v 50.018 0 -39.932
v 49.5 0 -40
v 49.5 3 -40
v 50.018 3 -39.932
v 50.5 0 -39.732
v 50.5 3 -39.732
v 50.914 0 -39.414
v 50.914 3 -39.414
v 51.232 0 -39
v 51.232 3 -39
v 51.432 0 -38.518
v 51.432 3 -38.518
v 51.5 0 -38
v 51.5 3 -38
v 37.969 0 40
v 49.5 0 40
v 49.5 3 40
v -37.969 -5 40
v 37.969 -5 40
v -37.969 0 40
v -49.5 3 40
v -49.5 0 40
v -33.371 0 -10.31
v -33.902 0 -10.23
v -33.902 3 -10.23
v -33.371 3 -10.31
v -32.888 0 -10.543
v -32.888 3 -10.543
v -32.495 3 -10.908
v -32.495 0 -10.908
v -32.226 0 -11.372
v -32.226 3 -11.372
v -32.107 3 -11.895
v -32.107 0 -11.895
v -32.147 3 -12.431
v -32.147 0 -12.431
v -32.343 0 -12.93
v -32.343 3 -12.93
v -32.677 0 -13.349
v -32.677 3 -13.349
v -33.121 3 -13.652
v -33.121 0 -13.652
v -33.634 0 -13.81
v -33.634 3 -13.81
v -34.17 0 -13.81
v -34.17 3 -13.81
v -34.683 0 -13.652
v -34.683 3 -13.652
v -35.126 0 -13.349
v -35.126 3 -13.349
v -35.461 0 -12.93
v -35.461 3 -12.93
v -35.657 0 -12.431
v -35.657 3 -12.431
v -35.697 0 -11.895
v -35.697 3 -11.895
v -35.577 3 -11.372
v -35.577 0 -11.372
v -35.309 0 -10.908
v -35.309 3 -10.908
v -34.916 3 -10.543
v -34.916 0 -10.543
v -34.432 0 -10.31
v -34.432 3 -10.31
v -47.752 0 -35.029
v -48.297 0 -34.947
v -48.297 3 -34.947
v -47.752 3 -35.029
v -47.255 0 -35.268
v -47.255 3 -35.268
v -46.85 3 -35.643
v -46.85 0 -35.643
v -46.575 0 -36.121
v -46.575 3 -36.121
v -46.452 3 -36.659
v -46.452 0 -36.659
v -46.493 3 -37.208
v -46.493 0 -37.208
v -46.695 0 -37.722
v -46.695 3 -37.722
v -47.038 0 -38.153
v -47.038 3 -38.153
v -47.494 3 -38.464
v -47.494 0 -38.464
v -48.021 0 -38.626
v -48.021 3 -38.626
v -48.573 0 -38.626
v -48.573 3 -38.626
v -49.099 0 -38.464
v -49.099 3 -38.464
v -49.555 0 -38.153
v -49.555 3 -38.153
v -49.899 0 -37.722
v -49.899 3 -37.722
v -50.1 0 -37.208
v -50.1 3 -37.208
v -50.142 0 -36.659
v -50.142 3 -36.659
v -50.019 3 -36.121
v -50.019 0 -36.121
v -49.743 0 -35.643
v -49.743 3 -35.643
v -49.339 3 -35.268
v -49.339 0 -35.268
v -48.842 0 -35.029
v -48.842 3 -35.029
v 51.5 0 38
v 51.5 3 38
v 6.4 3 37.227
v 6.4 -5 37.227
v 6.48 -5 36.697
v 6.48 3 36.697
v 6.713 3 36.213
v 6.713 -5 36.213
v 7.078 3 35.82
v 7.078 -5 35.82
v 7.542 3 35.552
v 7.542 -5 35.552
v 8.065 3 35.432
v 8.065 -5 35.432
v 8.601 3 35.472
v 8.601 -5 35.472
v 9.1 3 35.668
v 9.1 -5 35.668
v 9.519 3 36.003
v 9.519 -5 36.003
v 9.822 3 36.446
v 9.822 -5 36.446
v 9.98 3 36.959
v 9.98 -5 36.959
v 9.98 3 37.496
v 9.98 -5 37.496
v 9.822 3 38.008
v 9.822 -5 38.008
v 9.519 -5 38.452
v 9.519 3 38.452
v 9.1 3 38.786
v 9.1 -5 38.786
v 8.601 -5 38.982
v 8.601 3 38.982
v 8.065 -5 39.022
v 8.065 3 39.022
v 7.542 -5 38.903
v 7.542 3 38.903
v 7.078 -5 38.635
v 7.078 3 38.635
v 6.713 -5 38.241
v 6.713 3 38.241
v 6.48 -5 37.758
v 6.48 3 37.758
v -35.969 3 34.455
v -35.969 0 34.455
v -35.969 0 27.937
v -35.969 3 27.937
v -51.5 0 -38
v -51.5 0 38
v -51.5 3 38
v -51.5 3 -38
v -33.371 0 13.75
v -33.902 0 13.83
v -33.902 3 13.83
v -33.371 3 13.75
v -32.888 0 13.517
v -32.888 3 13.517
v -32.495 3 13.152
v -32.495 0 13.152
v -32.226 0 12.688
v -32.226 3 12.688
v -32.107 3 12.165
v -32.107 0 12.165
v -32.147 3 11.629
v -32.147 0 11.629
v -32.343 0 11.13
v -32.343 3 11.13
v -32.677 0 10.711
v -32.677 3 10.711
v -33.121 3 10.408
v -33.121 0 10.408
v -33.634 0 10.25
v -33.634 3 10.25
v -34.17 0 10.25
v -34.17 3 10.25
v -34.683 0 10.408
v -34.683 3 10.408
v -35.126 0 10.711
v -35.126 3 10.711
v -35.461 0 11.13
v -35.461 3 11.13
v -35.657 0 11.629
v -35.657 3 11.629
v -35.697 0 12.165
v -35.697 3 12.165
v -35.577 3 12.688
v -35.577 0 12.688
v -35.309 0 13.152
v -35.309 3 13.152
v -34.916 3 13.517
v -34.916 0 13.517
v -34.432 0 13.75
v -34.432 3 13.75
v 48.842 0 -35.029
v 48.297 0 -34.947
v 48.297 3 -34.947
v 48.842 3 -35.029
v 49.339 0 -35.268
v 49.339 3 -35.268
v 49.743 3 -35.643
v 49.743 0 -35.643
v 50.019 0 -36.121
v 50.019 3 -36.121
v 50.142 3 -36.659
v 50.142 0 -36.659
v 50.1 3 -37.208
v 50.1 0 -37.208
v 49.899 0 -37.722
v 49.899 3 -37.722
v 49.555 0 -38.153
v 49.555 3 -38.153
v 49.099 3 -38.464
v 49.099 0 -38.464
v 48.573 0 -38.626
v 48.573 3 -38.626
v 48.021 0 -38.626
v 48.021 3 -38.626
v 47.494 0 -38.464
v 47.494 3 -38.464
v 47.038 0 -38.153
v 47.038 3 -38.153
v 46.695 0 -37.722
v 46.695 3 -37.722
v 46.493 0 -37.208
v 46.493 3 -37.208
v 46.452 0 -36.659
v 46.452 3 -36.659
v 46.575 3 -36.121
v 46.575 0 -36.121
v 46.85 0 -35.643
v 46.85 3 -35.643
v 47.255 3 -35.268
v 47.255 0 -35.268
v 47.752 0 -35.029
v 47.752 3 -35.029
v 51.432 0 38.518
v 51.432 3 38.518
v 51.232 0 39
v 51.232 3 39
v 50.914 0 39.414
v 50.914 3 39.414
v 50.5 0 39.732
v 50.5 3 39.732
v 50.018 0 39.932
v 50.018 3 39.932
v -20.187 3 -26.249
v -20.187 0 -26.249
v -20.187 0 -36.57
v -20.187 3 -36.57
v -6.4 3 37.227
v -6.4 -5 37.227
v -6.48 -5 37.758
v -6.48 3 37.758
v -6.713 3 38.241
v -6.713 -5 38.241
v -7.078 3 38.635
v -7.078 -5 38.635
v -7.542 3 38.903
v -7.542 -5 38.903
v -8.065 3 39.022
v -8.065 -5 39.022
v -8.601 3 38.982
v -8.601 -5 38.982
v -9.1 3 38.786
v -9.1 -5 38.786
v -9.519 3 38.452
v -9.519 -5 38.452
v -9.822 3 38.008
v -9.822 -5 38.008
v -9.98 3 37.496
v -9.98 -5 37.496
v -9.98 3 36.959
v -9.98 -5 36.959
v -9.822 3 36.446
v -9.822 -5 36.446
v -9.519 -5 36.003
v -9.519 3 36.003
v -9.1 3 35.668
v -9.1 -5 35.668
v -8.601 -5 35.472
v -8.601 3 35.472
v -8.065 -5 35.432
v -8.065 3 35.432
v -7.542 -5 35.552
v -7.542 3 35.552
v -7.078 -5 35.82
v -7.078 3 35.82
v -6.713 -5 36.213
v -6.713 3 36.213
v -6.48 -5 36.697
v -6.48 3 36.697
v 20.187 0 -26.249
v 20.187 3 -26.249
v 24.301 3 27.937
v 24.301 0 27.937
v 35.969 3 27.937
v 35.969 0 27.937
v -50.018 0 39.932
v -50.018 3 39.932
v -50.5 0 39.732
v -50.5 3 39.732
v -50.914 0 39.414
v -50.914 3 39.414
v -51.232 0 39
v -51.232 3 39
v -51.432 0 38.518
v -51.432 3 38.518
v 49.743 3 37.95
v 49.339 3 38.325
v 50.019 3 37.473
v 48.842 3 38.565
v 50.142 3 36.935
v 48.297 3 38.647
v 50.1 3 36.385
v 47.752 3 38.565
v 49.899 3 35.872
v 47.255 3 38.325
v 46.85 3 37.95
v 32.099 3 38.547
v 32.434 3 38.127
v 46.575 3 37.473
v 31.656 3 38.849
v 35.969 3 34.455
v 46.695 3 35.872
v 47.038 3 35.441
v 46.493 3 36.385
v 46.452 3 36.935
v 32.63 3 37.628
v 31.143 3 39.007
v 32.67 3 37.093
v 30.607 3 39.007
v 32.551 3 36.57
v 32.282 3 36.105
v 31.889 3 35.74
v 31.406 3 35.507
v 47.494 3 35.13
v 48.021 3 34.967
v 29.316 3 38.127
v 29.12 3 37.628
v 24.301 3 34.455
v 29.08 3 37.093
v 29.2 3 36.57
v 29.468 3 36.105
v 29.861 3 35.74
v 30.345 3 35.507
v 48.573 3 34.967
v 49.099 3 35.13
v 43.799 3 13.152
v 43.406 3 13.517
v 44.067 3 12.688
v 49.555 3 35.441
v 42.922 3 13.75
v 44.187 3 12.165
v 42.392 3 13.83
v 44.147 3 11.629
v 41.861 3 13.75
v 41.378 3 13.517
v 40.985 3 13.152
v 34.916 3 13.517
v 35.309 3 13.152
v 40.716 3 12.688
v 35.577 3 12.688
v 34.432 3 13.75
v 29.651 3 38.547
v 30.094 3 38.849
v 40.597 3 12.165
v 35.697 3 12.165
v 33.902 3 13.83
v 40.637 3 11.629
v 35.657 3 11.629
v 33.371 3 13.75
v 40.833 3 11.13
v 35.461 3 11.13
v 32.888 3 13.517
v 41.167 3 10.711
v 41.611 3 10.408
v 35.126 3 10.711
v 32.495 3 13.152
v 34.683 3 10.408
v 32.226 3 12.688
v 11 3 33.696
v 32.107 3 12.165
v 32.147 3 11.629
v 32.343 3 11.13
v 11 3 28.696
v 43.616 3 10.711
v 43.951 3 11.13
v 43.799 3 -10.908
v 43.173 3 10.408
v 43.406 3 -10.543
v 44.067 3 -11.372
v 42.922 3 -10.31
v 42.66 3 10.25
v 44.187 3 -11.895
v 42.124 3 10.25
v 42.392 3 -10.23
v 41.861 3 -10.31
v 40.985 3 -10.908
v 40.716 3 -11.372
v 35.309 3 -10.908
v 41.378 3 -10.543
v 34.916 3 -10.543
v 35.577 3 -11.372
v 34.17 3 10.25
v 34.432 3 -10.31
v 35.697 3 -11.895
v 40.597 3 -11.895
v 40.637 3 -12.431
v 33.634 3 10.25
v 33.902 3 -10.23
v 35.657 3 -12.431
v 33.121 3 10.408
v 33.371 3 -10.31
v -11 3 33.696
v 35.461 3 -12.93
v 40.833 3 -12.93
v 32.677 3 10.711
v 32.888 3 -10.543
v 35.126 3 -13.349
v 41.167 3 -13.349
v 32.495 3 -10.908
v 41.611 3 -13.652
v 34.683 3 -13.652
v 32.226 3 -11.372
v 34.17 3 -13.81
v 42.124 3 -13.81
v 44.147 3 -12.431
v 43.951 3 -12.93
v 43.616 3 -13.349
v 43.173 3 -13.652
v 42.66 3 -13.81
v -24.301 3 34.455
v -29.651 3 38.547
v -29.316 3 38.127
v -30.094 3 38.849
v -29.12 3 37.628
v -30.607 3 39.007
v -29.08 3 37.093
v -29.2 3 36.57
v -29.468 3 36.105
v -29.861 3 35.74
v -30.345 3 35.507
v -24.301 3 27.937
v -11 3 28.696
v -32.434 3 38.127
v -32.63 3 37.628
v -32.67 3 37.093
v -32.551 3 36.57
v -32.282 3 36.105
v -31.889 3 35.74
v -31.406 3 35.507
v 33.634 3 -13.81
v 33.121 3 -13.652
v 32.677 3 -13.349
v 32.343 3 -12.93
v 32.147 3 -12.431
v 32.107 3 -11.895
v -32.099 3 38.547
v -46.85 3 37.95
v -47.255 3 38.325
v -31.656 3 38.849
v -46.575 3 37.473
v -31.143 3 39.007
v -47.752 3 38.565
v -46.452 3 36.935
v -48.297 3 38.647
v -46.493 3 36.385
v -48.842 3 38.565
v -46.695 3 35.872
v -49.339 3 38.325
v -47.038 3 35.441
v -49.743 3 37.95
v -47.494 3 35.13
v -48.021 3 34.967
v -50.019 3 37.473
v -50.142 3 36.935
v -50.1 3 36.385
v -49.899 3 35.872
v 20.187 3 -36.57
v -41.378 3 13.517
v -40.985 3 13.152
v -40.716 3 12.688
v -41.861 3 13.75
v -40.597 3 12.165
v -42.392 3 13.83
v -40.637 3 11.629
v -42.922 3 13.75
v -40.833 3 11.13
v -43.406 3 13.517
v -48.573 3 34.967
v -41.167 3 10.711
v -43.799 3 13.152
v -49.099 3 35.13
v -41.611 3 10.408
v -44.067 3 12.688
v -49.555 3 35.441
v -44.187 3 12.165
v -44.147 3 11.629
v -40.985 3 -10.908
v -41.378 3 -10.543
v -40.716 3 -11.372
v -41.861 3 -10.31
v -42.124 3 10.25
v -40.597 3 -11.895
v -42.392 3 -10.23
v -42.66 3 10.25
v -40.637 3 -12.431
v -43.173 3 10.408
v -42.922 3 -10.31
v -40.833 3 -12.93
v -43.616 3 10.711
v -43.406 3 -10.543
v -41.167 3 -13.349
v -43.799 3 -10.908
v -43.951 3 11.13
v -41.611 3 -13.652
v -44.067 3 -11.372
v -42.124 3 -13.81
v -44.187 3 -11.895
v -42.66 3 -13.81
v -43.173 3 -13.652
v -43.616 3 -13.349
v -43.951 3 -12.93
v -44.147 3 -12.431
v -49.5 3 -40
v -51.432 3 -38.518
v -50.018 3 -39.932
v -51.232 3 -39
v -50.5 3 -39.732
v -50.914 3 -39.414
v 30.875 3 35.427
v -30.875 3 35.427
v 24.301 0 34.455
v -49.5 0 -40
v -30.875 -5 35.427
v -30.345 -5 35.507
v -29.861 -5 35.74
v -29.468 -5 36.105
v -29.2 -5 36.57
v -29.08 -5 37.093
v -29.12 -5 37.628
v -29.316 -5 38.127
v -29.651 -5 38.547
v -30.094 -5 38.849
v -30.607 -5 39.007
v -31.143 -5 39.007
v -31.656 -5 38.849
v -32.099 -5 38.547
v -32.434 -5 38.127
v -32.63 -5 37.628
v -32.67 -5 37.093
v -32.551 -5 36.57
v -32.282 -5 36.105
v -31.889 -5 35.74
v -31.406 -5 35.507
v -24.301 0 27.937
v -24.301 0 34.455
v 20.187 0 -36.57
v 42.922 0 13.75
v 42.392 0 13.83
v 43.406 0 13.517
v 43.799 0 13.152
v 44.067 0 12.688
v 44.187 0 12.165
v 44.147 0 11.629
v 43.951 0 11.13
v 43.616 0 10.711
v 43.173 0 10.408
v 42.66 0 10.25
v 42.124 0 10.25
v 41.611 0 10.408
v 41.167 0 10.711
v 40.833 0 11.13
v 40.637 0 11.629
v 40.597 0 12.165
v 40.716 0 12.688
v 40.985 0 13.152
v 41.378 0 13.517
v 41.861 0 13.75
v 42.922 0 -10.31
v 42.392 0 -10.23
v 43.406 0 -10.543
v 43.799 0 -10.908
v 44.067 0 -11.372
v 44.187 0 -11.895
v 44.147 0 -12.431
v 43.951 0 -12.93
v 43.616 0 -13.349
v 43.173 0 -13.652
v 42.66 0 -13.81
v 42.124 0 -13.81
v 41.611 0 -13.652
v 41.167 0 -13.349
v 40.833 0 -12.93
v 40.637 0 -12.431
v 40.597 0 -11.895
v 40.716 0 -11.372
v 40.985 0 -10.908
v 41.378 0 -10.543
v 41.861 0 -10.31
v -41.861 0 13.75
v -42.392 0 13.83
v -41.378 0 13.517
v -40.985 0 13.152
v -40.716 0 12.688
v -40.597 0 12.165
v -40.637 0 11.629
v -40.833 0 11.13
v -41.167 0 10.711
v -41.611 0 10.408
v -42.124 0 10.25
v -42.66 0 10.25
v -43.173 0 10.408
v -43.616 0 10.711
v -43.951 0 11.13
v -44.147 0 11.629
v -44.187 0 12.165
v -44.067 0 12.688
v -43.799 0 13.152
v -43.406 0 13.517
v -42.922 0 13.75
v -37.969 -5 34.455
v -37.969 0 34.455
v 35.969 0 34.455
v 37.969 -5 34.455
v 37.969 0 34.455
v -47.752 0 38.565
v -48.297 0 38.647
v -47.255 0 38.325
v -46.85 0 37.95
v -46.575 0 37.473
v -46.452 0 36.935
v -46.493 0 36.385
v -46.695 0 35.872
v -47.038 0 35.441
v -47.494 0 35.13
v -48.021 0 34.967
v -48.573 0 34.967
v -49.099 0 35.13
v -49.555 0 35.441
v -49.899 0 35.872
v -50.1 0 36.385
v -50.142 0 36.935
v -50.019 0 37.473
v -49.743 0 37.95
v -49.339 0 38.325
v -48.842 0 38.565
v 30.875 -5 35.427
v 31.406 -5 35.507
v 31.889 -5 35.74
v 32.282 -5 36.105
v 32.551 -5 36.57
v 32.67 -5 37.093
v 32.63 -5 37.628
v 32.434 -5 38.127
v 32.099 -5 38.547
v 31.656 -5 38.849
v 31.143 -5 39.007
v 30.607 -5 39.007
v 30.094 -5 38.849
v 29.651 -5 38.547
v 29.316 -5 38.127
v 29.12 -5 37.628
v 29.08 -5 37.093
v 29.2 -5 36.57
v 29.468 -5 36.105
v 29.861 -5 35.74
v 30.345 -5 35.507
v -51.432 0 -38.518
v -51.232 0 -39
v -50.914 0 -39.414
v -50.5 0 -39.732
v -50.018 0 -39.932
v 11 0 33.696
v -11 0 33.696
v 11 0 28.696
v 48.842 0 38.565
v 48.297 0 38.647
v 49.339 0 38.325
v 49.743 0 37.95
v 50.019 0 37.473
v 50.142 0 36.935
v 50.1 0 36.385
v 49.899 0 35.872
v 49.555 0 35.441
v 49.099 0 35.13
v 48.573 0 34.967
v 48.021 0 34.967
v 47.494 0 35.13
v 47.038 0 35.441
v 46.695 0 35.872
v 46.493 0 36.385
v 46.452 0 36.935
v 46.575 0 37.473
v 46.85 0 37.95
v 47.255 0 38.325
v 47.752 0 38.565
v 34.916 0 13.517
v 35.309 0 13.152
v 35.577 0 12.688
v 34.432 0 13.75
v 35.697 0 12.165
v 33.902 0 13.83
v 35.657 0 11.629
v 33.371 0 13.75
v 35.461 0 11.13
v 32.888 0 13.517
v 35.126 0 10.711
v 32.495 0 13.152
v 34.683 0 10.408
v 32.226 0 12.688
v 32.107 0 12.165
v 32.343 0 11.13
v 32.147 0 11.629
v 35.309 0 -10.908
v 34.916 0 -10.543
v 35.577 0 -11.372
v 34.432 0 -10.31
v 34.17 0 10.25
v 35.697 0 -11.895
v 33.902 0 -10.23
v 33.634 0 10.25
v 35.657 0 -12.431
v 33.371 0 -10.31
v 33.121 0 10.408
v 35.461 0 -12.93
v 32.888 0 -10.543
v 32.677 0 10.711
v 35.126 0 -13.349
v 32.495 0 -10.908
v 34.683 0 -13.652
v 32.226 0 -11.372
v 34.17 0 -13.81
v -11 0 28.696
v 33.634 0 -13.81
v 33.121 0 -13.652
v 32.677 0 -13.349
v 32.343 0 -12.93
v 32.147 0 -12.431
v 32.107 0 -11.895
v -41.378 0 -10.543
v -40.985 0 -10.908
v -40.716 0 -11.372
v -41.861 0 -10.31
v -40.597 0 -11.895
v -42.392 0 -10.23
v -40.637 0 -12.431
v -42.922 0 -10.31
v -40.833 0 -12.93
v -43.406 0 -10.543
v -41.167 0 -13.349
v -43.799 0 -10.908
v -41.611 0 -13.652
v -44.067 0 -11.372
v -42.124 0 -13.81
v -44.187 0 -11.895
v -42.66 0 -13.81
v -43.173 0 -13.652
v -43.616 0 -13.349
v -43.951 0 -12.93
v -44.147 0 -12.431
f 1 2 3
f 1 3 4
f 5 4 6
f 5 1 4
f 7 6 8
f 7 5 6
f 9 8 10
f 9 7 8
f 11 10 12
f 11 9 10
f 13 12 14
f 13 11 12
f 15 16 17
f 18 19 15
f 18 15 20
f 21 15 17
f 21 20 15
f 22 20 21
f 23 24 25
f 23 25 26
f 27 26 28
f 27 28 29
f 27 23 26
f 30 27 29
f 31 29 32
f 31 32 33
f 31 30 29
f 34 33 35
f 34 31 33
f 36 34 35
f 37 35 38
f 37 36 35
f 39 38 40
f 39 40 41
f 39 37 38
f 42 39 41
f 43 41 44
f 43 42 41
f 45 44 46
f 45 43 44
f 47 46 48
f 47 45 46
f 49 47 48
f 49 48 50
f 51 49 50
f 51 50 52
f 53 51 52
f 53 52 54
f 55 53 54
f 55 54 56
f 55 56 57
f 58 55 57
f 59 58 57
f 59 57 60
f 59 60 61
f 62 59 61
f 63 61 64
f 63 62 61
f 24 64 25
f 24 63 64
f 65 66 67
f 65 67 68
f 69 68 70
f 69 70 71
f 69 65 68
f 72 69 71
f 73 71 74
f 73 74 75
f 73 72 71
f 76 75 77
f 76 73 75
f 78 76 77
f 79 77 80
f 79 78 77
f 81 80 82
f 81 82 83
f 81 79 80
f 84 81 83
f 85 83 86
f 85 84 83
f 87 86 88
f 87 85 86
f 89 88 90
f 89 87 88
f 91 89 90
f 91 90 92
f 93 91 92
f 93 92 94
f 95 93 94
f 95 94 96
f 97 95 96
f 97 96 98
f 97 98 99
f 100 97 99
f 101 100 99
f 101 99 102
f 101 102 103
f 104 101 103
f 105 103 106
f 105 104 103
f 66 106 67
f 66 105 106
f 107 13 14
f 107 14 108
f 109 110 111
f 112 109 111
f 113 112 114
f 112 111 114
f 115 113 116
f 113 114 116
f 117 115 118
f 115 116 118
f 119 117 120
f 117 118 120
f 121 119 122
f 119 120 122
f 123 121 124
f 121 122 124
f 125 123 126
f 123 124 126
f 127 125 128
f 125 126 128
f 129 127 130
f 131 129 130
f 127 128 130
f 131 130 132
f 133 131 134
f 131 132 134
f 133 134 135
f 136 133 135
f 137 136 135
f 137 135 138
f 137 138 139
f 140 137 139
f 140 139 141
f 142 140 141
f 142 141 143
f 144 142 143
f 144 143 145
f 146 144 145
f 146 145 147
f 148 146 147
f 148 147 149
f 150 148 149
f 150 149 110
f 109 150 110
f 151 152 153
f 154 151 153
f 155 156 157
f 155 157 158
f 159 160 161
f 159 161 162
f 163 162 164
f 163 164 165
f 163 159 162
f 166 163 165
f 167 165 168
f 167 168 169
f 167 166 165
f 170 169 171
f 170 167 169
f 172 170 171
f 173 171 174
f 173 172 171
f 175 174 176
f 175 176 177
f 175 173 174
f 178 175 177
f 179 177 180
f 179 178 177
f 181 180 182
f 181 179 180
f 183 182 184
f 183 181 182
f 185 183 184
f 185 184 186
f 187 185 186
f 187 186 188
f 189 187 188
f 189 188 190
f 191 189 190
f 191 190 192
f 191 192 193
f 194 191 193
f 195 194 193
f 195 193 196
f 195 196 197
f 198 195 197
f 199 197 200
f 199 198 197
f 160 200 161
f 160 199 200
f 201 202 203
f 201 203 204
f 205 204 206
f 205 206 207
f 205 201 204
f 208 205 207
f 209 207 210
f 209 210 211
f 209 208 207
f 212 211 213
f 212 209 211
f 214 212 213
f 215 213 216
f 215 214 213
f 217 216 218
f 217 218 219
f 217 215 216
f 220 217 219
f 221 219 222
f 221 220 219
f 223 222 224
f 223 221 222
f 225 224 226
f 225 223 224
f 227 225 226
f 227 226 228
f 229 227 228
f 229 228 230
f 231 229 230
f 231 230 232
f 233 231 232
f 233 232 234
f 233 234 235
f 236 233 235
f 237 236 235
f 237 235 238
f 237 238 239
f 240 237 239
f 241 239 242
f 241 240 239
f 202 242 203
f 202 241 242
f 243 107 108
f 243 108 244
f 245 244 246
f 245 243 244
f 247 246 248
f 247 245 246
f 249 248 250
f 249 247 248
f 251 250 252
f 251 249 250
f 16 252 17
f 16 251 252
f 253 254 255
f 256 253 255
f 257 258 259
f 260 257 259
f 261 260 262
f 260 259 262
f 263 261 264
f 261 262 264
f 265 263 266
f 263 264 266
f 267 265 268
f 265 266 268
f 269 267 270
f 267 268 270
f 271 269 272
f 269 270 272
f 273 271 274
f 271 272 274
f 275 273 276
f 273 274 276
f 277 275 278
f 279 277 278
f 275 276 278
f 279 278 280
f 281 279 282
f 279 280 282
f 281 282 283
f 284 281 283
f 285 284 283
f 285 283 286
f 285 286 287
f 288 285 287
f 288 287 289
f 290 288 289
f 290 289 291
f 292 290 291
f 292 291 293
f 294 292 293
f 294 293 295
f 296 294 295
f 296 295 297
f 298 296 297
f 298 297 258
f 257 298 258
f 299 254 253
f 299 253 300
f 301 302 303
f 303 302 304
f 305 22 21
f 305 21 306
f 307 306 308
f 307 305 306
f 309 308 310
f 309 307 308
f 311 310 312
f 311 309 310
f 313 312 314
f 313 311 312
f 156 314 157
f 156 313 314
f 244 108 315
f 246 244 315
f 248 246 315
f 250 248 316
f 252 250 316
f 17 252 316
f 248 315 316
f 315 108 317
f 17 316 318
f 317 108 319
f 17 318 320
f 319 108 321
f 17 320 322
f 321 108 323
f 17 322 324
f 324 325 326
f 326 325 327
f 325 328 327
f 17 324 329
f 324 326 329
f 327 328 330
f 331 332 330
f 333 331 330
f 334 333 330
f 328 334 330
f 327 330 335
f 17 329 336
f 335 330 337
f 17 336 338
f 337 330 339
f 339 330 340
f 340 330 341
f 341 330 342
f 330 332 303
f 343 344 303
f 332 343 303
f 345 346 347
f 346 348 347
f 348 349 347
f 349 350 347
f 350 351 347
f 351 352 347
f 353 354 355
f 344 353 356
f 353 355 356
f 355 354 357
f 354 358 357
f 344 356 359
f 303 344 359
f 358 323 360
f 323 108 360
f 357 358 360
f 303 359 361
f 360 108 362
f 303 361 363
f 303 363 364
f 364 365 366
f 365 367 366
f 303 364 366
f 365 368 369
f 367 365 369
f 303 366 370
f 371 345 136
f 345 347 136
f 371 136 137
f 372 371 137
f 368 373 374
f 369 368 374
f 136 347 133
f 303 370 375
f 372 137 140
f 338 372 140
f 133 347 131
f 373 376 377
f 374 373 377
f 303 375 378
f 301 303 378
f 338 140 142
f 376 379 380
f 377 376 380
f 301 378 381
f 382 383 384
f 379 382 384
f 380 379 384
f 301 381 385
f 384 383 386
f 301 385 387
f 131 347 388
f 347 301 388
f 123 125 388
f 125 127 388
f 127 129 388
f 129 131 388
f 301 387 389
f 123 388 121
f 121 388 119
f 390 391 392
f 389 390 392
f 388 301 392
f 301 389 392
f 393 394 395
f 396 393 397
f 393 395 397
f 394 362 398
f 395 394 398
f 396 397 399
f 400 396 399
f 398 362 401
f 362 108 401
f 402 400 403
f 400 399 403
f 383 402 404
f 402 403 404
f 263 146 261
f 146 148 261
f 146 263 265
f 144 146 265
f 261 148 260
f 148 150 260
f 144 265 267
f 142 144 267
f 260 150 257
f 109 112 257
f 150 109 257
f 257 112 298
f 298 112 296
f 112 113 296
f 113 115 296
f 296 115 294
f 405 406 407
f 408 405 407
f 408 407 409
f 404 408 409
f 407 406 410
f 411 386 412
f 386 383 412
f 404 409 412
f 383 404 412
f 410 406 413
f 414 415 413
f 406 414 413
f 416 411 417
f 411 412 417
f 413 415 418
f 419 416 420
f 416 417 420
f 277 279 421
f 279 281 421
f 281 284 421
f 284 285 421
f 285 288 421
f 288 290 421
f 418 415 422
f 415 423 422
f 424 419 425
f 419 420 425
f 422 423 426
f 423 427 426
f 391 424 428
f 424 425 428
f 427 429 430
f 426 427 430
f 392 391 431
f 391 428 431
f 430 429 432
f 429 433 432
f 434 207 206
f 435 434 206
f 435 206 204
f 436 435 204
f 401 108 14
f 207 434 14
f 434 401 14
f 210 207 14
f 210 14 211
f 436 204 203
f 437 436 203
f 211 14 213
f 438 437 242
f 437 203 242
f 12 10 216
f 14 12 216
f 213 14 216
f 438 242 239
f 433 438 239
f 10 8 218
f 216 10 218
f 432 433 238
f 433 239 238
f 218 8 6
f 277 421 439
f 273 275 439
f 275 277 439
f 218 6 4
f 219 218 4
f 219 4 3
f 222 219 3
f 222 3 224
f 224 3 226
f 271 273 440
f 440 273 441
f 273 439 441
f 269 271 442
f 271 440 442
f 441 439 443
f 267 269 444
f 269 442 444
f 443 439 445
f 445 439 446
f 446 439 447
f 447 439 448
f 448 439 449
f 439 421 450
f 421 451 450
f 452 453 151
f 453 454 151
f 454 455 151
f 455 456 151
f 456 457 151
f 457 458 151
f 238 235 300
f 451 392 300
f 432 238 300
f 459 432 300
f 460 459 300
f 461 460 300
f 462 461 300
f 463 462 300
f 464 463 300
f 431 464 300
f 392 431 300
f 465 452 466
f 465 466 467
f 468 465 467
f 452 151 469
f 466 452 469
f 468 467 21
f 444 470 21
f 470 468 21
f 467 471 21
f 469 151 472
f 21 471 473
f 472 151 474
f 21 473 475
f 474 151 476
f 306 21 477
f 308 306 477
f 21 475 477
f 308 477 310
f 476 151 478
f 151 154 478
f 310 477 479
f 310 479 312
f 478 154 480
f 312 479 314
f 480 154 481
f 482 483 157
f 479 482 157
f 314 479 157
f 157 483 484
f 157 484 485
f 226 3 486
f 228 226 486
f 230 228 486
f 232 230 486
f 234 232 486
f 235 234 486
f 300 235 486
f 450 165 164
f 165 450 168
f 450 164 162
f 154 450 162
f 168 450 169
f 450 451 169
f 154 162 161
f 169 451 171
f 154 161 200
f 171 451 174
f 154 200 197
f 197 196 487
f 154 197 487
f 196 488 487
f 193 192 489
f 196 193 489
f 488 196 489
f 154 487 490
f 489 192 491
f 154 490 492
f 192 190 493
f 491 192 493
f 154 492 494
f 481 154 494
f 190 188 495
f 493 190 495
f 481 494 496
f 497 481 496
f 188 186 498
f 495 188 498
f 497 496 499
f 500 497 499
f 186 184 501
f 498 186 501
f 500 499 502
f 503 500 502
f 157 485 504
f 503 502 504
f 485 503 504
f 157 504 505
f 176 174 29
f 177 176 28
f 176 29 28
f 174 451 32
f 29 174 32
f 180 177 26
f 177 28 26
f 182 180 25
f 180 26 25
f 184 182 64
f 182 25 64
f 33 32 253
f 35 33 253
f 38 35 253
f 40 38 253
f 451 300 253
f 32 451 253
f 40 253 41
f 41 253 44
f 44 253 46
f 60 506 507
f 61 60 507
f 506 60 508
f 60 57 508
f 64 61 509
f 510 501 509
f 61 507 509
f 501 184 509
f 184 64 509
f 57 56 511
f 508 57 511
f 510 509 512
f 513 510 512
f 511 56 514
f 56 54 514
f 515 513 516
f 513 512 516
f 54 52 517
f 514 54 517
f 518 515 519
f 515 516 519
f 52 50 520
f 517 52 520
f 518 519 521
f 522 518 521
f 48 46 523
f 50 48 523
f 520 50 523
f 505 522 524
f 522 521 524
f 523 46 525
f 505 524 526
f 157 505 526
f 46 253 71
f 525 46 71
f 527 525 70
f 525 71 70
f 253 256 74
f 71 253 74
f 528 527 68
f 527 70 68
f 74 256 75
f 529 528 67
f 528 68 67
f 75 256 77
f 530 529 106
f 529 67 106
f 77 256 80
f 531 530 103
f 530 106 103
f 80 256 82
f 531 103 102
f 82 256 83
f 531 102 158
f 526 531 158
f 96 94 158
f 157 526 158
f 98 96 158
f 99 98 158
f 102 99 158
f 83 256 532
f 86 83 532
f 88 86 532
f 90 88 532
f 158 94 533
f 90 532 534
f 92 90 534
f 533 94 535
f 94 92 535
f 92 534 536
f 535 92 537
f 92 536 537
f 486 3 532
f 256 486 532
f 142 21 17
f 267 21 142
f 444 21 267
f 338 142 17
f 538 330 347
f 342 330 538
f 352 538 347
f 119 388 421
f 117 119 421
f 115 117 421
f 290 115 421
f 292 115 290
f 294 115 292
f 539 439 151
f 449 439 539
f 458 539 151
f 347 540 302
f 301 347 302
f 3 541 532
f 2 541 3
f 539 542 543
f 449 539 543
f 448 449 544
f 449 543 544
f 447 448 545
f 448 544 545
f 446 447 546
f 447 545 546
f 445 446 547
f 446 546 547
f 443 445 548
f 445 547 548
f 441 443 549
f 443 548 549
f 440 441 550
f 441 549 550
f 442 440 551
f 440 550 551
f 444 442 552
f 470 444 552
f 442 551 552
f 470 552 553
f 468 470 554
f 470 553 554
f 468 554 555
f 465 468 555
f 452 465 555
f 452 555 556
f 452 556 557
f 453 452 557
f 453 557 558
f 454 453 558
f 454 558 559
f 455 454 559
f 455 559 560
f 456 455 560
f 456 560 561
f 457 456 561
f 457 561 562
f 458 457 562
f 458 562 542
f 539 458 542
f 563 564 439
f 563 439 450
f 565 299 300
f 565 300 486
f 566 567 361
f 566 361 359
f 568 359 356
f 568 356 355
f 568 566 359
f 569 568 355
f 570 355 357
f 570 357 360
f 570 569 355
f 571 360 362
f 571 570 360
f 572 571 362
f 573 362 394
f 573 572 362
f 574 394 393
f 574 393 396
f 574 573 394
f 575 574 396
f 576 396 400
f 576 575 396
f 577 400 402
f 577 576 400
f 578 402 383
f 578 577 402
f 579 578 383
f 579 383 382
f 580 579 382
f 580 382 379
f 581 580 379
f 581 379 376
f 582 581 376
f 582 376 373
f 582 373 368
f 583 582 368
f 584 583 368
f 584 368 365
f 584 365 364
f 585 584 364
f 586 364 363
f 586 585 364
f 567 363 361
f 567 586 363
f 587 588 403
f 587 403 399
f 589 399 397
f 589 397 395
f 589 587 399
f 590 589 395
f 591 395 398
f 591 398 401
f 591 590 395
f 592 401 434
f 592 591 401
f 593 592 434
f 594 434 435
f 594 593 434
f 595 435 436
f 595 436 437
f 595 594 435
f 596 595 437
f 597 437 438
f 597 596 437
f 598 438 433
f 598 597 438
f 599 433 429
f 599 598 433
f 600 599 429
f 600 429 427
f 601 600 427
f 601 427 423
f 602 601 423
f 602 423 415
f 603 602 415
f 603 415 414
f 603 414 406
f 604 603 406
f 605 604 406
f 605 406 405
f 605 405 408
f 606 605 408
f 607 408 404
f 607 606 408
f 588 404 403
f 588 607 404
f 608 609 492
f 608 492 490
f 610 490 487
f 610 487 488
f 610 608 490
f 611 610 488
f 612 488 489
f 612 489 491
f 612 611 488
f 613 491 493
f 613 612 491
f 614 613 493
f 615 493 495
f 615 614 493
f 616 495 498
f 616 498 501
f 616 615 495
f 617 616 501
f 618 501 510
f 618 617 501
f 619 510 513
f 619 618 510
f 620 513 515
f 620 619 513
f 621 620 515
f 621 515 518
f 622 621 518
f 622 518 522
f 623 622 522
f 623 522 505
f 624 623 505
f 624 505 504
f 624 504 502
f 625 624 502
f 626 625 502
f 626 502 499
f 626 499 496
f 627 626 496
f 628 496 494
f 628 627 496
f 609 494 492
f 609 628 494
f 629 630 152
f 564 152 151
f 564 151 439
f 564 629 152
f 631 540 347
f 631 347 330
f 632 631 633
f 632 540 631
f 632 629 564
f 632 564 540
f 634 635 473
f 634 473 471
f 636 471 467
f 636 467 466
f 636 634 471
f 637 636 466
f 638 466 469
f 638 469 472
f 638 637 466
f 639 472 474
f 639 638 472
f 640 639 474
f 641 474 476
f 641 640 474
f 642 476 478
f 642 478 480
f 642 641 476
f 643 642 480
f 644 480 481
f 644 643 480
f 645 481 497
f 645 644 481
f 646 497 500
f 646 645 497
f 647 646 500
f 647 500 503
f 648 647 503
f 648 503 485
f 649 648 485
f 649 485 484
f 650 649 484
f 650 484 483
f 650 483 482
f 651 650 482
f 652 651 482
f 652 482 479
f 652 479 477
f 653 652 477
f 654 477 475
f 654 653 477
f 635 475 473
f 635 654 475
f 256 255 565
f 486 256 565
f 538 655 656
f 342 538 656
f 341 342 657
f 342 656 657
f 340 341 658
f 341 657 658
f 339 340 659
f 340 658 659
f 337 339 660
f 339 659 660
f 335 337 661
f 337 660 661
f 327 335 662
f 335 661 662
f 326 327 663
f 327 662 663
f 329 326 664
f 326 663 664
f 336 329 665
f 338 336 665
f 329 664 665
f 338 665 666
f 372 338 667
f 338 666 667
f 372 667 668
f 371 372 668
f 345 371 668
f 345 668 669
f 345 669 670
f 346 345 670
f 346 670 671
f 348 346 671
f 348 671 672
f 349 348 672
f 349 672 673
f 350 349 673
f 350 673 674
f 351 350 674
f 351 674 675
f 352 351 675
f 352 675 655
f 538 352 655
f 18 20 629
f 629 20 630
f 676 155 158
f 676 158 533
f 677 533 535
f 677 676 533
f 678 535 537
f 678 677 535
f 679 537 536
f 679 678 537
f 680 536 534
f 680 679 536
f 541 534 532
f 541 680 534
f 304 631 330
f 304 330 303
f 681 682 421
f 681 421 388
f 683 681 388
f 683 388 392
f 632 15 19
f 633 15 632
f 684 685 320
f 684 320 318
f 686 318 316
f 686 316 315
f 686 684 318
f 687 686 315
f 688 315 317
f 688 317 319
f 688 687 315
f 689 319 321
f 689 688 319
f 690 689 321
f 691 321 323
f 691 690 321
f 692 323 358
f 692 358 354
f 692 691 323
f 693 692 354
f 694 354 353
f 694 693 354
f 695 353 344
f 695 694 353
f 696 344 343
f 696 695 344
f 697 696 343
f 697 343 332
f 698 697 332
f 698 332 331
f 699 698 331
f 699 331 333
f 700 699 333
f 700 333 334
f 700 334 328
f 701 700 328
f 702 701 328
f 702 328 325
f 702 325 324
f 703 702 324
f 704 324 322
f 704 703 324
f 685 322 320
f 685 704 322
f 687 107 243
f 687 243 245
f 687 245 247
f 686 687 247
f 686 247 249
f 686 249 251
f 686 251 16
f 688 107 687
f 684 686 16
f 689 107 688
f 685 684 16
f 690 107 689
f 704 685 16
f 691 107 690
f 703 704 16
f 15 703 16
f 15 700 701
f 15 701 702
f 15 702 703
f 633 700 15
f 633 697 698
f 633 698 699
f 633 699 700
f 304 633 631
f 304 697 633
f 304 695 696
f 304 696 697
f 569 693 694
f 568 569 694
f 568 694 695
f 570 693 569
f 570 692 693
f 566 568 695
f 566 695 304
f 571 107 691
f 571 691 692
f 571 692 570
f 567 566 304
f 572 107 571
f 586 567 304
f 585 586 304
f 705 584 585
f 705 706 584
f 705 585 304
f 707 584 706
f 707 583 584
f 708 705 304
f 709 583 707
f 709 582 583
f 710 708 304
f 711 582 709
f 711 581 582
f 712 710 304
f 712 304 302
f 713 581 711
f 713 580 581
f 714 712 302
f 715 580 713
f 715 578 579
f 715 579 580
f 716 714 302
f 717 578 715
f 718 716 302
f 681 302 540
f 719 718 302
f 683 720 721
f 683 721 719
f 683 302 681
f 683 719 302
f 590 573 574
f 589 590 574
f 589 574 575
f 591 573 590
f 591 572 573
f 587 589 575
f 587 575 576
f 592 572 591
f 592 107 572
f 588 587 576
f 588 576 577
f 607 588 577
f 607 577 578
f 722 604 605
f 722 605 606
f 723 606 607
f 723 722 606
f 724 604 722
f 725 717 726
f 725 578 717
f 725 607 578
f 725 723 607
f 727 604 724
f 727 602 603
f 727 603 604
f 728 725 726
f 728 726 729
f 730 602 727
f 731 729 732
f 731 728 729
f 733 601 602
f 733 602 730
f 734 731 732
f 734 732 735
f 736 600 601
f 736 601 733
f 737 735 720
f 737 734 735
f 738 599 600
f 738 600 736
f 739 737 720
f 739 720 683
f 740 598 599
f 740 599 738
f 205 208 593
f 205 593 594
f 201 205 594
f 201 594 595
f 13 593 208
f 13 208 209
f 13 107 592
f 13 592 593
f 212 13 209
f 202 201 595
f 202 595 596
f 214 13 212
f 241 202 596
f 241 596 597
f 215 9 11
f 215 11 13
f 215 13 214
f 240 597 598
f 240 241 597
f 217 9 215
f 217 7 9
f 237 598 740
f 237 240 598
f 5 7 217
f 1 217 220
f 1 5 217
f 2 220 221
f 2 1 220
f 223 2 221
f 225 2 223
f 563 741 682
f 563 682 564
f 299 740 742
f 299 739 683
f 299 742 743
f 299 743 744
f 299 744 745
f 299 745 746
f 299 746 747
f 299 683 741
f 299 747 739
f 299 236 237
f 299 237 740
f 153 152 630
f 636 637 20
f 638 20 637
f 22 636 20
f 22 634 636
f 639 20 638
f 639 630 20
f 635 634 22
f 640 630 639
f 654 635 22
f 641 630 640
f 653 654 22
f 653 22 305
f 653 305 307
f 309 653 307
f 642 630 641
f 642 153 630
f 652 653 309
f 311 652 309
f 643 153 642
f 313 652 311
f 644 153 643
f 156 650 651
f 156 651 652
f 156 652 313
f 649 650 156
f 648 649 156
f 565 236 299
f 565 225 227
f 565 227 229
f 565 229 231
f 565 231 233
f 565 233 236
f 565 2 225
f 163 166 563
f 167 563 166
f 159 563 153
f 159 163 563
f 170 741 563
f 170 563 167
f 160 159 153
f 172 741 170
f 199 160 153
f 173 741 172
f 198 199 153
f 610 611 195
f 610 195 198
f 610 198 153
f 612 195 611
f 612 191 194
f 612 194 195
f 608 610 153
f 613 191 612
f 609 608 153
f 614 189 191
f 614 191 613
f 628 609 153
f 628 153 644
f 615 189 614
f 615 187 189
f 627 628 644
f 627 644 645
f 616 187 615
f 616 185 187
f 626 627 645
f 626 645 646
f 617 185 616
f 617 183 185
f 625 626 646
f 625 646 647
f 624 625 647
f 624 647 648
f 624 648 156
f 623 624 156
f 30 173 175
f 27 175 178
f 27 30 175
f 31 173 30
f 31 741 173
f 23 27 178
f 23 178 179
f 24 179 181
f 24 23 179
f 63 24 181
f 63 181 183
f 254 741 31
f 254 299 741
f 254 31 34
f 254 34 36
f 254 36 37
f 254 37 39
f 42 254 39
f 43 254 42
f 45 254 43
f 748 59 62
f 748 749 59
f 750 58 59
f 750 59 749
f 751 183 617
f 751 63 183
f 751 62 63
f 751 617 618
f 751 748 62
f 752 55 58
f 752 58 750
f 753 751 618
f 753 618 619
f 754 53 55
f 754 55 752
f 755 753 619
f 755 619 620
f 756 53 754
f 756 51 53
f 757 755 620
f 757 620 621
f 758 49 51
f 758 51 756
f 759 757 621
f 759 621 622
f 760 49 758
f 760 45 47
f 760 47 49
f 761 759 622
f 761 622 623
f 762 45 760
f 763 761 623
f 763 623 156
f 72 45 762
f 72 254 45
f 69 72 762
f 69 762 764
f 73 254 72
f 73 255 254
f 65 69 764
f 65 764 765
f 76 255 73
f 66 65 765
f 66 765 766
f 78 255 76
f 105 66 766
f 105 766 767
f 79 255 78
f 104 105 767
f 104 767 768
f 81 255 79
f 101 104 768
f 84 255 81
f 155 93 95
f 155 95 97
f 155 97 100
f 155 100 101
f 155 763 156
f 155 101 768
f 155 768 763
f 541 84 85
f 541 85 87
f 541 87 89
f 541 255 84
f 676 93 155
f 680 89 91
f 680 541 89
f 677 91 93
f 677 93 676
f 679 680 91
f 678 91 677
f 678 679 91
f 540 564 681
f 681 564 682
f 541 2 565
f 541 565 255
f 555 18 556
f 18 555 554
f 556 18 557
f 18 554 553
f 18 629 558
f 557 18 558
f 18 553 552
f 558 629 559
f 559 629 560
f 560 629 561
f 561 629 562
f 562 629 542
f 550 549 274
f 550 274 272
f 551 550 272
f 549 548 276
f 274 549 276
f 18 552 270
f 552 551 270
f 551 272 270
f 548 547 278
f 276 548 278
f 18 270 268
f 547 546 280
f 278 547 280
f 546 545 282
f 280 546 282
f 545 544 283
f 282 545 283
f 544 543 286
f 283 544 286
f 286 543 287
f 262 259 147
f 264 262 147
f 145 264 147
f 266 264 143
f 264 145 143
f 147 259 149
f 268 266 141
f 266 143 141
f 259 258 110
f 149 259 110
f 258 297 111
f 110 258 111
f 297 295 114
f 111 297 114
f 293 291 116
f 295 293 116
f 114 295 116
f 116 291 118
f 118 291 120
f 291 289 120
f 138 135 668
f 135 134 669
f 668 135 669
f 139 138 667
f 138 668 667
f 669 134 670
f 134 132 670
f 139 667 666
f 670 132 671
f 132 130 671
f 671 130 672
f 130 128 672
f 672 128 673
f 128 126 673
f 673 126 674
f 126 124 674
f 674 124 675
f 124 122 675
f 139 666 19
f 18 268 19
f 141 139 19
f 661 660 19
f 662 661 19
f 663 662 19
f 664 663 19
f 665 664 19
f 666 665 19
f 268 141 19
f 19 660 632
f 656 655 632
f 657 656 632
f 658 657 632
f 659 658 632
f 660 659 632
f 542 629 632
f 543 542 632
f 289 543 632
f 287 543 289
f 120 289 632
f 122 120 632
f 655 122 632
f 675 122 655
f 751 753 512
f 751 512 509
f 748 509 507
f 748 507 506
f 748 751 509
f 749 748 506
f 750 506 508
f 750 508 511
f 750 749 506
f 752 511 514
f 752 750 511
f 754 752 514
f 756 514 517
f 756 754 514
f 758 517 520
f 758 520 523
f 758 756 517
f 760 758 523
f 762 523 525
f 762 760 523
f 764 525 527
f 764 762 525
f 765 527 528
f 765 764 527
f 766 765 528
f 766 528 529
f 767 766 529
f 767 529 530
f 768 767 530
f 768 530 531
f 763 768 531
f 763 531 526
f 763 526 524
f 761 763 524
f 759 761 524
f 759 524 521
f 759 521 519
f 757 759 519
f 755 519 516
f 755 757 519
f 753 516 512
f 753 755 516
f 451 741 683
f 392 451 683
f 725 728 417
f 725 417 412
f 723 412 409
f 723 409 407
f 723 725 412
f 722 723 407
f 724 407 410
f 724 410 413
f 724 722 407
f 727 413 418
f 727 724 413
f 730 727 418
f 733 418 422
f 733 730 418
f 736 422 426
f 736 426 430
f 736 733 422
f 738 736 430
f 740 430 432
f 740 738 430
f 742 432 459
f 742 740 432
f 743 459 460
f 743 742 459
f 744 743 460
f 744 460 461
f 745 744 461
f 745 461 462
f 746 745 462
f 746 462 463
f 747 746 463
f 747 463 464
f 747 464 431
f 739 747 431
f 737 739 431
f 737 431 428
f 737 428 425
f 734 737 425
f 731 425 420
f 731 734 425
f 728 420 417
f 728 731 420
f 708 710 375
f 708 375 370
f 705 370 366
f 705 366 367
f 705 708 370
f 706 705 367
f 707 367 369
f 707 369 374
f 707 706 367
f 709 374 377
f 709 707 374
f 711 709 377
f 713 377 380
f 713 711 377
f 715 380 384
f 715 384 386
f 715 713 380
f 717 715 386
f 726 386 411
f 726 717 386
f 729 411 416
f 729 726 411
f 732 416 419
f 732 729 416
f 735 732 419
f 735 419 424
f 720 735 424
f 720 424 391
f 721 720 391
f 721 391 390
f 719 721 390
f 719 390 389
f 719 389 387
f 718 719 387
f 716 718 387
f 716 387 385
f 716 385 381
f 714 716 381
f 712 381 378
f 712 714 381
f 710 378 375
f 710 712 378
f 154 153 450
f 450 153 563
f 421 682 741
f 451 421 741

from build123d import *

# Parameters (mm, degrees)
SKETCH_1_R          = 1.85
SKETCH_1_R_2        = 1.8
SKETCH_1_W          = 40.374860346
SKETCH_1_H          = 10.321291022
SKETCH_1_W_2        = 22
SKETCH_1_H_2        = 5
SKETCH_1_W_3        = 11.667697598
SKETCH_1_H_3        = 6.517356375
EXTRUDE_1_DEPTH     = 3
SKETCH_2_W          = 75.93825213
SKETCH_2_H          = 5.545458332
EXTRUDE_2_DEPTH     = 8
SKETCH_3_R          = 1.8
CUT_EXTRUDE_1_DEPTH = 15


with BuildPart() as part:
    # 草图1 → 凸台-拉伸1 (new body)
    with BuildSketch(Plane(origin=(0, 0, 0), x_dir=(1, 0, 0), z_dir=(0, 1, 0))):
        with BuildLine():
            Line((49.5, -40), (-49.5, -40))
            ThreePointArc((-49.5, -40), (-50.914213562, -39.414213562), (-51.5, -38))
            Line((-51.5, -38), (-51.5, 38))
            ThreePointArc((-51.5, 38), (-50.914213562, 39.414213562), (-49.5, 40))
            Line((-49.5, 40), (49.5, 40))
            ThreePointArc((49.5, 40), (50.914213562, 39.414213562), (51.5, 38))
            Line((51.5, 38), (51.5, -38))
            ThreePointArc((51.5, -38), (50.914213562, -39.414213562), (49.5, -40))
        make_face()
        with Locations(Location((-48.296806281, 36.796806281, 0), (0, 0, 270))):
            Circle(SKETCH_1_R, mode=Mode.SUBTRACT)
        with Locations(Location((48.296806281, 36.796806281, 0), (0, 0, 270))):
            Circle(SKETCH_1_R, mode=Mode.SUBTRACT)
        with Locations(Location((48.296806281, -36.796806281, 0), (0, 0, 270))):
            Circle(SKETCH_1_R, mode=Mode.SUBTRACT)
        with Locations(Location((-48.296806281, -36.796806281, 0), (0, 0, 270))):
            Circle(SKETCH_1_R, mode=Mode.SUBTRACT)
        with Locations(Location((-42.391806281, 12.03, 0), (0, 0, 270))):
            Circle(SKETCH_1_R_2, mode=Mode.SUBTRACT)
        with Locations(Location((-33.901806281, 12.03, 0), (0, 0, 270))):
            Circle(SKETCH_1_R_2, mode=Mode.SUBTRACT)
        with Locations(Location((-33.901806281, -12.03, 0), (0, 0, 270))):
            Circle(SKETCH_1_R_2, mode=Mode.SUBTRACT)
        with Locations(Location((-42.391806281, -12.03, 0), (0, 0, 270))):
            Circle(SKETCH_1_R_2, mode=Mode.SUBTRACT)
        with Locations(Location((33.901806281, -12.03, 0), (0, 0, 270))):
            Circle(SKETCH_1_R_2, mode=Mode.SUBTRACT)
        with Locations(Location((42.391806281, -12.03, 0), (0, 0, 270))):
            Circle(SKETCH_1_R_2, mode=Mode.SUBTRACT)
        with Locations(Location((33.901806281, 12.03, 0), (0, 0, 270))):
            Circle(SKETCH_1_R_2, mode=Mode.SUBTRACT)
        with Locations(Location((42.391806281, 12.03, 0), (0, 0, 270))):
            Circle(SKETCH_1_R_2, mode=Mode.SUBTRACT)
        with Locations((0, 31.409786363)):
            Rectangle(SKETCH_1_W, SKETCH_1_H, mode=Mode.SUBTRACT)
        with Locations((0, -31.19586348)):
            Rectangle(SKETCH_1_W_2, SKETCH_1_H_2, mode=Mode.SUBTRACT)
        with Locations((30.135277266, -31.195863481)):
            Rectangle(SKETCH_1_W_3, SKETCH_1_H_3, mode=Mode.SUBTRACT)
        with Locations((-30.135277266, -31.195863481)):
            Rectangle(SKETCH_1_W_3, SKETCH_1_H_3, mode=Mode.SUBTRACT)
    extrude(amount=EXTRUDE_1_DEPTH)

    # 草图2 → 凸台-拉伸2 (add)
    with BuildSketch(Plane(origin=(0, 3, 0), x_dir=(1, 0, 0), z_dir=(0, 1, 0))):
        with Locations((0, -37.227270834)):
            Rectangle(SKETCH_2_W, SKETCH_2_H)
    extrude(amount=-EXTRUDE_2_DEPTH)

    # 草图3 → 切除-拉伸1 (cut)
    with BuildSketch(Plane(origin=(0, -5, 0), x_dir=(-1, 0, 0), z_dir=(0, -1, 0))):
        with Locations(Location((30.875113943, -37.227270834, 0), (0, 0, 90))):
            Circle(SKETCH_3_R)
        with BuildLine():
            ThreePointArc((10, -37.227270834), (8.2, -35.427270834), (6.4, -37.227270834))
            Line((6.4, -37.227270834), (10, -37.227270834))
        make_face()
        with BuildLine():
            Line((10, -37.227270834), (6.4, -37.227270834))
            ThreePointArc((6.4, -37.227270834), (8.2, -39.027270834), (10, -37.227270834))
        make_face()
        with BuildLine():
            ThreePointArc((-10, -37.227270834), (-8.2, -39.027270834), (-6.4, -37.227270834))
            Line((-6.4, -37.227270834), (-10, -37.227270834))
        make_face()
        with BuildLine():
            Line((-10, -37.227270834), (-6.4, -37.227270834))
            ThreePointArc((-6.4, -37.227270834), (-8.2, -35.427270834), (-10, -37.227270834))
        make_face()
        with Locations(Location((-30.875113943, -37.227270834, 0), (0, 0, 90))):
            Circle(SKETCH_3_R)
    extrude(amount=-CUT_EXTRUDE_1_DEPTH, mode=Mode.SUBTRACT)


solid = part.part
